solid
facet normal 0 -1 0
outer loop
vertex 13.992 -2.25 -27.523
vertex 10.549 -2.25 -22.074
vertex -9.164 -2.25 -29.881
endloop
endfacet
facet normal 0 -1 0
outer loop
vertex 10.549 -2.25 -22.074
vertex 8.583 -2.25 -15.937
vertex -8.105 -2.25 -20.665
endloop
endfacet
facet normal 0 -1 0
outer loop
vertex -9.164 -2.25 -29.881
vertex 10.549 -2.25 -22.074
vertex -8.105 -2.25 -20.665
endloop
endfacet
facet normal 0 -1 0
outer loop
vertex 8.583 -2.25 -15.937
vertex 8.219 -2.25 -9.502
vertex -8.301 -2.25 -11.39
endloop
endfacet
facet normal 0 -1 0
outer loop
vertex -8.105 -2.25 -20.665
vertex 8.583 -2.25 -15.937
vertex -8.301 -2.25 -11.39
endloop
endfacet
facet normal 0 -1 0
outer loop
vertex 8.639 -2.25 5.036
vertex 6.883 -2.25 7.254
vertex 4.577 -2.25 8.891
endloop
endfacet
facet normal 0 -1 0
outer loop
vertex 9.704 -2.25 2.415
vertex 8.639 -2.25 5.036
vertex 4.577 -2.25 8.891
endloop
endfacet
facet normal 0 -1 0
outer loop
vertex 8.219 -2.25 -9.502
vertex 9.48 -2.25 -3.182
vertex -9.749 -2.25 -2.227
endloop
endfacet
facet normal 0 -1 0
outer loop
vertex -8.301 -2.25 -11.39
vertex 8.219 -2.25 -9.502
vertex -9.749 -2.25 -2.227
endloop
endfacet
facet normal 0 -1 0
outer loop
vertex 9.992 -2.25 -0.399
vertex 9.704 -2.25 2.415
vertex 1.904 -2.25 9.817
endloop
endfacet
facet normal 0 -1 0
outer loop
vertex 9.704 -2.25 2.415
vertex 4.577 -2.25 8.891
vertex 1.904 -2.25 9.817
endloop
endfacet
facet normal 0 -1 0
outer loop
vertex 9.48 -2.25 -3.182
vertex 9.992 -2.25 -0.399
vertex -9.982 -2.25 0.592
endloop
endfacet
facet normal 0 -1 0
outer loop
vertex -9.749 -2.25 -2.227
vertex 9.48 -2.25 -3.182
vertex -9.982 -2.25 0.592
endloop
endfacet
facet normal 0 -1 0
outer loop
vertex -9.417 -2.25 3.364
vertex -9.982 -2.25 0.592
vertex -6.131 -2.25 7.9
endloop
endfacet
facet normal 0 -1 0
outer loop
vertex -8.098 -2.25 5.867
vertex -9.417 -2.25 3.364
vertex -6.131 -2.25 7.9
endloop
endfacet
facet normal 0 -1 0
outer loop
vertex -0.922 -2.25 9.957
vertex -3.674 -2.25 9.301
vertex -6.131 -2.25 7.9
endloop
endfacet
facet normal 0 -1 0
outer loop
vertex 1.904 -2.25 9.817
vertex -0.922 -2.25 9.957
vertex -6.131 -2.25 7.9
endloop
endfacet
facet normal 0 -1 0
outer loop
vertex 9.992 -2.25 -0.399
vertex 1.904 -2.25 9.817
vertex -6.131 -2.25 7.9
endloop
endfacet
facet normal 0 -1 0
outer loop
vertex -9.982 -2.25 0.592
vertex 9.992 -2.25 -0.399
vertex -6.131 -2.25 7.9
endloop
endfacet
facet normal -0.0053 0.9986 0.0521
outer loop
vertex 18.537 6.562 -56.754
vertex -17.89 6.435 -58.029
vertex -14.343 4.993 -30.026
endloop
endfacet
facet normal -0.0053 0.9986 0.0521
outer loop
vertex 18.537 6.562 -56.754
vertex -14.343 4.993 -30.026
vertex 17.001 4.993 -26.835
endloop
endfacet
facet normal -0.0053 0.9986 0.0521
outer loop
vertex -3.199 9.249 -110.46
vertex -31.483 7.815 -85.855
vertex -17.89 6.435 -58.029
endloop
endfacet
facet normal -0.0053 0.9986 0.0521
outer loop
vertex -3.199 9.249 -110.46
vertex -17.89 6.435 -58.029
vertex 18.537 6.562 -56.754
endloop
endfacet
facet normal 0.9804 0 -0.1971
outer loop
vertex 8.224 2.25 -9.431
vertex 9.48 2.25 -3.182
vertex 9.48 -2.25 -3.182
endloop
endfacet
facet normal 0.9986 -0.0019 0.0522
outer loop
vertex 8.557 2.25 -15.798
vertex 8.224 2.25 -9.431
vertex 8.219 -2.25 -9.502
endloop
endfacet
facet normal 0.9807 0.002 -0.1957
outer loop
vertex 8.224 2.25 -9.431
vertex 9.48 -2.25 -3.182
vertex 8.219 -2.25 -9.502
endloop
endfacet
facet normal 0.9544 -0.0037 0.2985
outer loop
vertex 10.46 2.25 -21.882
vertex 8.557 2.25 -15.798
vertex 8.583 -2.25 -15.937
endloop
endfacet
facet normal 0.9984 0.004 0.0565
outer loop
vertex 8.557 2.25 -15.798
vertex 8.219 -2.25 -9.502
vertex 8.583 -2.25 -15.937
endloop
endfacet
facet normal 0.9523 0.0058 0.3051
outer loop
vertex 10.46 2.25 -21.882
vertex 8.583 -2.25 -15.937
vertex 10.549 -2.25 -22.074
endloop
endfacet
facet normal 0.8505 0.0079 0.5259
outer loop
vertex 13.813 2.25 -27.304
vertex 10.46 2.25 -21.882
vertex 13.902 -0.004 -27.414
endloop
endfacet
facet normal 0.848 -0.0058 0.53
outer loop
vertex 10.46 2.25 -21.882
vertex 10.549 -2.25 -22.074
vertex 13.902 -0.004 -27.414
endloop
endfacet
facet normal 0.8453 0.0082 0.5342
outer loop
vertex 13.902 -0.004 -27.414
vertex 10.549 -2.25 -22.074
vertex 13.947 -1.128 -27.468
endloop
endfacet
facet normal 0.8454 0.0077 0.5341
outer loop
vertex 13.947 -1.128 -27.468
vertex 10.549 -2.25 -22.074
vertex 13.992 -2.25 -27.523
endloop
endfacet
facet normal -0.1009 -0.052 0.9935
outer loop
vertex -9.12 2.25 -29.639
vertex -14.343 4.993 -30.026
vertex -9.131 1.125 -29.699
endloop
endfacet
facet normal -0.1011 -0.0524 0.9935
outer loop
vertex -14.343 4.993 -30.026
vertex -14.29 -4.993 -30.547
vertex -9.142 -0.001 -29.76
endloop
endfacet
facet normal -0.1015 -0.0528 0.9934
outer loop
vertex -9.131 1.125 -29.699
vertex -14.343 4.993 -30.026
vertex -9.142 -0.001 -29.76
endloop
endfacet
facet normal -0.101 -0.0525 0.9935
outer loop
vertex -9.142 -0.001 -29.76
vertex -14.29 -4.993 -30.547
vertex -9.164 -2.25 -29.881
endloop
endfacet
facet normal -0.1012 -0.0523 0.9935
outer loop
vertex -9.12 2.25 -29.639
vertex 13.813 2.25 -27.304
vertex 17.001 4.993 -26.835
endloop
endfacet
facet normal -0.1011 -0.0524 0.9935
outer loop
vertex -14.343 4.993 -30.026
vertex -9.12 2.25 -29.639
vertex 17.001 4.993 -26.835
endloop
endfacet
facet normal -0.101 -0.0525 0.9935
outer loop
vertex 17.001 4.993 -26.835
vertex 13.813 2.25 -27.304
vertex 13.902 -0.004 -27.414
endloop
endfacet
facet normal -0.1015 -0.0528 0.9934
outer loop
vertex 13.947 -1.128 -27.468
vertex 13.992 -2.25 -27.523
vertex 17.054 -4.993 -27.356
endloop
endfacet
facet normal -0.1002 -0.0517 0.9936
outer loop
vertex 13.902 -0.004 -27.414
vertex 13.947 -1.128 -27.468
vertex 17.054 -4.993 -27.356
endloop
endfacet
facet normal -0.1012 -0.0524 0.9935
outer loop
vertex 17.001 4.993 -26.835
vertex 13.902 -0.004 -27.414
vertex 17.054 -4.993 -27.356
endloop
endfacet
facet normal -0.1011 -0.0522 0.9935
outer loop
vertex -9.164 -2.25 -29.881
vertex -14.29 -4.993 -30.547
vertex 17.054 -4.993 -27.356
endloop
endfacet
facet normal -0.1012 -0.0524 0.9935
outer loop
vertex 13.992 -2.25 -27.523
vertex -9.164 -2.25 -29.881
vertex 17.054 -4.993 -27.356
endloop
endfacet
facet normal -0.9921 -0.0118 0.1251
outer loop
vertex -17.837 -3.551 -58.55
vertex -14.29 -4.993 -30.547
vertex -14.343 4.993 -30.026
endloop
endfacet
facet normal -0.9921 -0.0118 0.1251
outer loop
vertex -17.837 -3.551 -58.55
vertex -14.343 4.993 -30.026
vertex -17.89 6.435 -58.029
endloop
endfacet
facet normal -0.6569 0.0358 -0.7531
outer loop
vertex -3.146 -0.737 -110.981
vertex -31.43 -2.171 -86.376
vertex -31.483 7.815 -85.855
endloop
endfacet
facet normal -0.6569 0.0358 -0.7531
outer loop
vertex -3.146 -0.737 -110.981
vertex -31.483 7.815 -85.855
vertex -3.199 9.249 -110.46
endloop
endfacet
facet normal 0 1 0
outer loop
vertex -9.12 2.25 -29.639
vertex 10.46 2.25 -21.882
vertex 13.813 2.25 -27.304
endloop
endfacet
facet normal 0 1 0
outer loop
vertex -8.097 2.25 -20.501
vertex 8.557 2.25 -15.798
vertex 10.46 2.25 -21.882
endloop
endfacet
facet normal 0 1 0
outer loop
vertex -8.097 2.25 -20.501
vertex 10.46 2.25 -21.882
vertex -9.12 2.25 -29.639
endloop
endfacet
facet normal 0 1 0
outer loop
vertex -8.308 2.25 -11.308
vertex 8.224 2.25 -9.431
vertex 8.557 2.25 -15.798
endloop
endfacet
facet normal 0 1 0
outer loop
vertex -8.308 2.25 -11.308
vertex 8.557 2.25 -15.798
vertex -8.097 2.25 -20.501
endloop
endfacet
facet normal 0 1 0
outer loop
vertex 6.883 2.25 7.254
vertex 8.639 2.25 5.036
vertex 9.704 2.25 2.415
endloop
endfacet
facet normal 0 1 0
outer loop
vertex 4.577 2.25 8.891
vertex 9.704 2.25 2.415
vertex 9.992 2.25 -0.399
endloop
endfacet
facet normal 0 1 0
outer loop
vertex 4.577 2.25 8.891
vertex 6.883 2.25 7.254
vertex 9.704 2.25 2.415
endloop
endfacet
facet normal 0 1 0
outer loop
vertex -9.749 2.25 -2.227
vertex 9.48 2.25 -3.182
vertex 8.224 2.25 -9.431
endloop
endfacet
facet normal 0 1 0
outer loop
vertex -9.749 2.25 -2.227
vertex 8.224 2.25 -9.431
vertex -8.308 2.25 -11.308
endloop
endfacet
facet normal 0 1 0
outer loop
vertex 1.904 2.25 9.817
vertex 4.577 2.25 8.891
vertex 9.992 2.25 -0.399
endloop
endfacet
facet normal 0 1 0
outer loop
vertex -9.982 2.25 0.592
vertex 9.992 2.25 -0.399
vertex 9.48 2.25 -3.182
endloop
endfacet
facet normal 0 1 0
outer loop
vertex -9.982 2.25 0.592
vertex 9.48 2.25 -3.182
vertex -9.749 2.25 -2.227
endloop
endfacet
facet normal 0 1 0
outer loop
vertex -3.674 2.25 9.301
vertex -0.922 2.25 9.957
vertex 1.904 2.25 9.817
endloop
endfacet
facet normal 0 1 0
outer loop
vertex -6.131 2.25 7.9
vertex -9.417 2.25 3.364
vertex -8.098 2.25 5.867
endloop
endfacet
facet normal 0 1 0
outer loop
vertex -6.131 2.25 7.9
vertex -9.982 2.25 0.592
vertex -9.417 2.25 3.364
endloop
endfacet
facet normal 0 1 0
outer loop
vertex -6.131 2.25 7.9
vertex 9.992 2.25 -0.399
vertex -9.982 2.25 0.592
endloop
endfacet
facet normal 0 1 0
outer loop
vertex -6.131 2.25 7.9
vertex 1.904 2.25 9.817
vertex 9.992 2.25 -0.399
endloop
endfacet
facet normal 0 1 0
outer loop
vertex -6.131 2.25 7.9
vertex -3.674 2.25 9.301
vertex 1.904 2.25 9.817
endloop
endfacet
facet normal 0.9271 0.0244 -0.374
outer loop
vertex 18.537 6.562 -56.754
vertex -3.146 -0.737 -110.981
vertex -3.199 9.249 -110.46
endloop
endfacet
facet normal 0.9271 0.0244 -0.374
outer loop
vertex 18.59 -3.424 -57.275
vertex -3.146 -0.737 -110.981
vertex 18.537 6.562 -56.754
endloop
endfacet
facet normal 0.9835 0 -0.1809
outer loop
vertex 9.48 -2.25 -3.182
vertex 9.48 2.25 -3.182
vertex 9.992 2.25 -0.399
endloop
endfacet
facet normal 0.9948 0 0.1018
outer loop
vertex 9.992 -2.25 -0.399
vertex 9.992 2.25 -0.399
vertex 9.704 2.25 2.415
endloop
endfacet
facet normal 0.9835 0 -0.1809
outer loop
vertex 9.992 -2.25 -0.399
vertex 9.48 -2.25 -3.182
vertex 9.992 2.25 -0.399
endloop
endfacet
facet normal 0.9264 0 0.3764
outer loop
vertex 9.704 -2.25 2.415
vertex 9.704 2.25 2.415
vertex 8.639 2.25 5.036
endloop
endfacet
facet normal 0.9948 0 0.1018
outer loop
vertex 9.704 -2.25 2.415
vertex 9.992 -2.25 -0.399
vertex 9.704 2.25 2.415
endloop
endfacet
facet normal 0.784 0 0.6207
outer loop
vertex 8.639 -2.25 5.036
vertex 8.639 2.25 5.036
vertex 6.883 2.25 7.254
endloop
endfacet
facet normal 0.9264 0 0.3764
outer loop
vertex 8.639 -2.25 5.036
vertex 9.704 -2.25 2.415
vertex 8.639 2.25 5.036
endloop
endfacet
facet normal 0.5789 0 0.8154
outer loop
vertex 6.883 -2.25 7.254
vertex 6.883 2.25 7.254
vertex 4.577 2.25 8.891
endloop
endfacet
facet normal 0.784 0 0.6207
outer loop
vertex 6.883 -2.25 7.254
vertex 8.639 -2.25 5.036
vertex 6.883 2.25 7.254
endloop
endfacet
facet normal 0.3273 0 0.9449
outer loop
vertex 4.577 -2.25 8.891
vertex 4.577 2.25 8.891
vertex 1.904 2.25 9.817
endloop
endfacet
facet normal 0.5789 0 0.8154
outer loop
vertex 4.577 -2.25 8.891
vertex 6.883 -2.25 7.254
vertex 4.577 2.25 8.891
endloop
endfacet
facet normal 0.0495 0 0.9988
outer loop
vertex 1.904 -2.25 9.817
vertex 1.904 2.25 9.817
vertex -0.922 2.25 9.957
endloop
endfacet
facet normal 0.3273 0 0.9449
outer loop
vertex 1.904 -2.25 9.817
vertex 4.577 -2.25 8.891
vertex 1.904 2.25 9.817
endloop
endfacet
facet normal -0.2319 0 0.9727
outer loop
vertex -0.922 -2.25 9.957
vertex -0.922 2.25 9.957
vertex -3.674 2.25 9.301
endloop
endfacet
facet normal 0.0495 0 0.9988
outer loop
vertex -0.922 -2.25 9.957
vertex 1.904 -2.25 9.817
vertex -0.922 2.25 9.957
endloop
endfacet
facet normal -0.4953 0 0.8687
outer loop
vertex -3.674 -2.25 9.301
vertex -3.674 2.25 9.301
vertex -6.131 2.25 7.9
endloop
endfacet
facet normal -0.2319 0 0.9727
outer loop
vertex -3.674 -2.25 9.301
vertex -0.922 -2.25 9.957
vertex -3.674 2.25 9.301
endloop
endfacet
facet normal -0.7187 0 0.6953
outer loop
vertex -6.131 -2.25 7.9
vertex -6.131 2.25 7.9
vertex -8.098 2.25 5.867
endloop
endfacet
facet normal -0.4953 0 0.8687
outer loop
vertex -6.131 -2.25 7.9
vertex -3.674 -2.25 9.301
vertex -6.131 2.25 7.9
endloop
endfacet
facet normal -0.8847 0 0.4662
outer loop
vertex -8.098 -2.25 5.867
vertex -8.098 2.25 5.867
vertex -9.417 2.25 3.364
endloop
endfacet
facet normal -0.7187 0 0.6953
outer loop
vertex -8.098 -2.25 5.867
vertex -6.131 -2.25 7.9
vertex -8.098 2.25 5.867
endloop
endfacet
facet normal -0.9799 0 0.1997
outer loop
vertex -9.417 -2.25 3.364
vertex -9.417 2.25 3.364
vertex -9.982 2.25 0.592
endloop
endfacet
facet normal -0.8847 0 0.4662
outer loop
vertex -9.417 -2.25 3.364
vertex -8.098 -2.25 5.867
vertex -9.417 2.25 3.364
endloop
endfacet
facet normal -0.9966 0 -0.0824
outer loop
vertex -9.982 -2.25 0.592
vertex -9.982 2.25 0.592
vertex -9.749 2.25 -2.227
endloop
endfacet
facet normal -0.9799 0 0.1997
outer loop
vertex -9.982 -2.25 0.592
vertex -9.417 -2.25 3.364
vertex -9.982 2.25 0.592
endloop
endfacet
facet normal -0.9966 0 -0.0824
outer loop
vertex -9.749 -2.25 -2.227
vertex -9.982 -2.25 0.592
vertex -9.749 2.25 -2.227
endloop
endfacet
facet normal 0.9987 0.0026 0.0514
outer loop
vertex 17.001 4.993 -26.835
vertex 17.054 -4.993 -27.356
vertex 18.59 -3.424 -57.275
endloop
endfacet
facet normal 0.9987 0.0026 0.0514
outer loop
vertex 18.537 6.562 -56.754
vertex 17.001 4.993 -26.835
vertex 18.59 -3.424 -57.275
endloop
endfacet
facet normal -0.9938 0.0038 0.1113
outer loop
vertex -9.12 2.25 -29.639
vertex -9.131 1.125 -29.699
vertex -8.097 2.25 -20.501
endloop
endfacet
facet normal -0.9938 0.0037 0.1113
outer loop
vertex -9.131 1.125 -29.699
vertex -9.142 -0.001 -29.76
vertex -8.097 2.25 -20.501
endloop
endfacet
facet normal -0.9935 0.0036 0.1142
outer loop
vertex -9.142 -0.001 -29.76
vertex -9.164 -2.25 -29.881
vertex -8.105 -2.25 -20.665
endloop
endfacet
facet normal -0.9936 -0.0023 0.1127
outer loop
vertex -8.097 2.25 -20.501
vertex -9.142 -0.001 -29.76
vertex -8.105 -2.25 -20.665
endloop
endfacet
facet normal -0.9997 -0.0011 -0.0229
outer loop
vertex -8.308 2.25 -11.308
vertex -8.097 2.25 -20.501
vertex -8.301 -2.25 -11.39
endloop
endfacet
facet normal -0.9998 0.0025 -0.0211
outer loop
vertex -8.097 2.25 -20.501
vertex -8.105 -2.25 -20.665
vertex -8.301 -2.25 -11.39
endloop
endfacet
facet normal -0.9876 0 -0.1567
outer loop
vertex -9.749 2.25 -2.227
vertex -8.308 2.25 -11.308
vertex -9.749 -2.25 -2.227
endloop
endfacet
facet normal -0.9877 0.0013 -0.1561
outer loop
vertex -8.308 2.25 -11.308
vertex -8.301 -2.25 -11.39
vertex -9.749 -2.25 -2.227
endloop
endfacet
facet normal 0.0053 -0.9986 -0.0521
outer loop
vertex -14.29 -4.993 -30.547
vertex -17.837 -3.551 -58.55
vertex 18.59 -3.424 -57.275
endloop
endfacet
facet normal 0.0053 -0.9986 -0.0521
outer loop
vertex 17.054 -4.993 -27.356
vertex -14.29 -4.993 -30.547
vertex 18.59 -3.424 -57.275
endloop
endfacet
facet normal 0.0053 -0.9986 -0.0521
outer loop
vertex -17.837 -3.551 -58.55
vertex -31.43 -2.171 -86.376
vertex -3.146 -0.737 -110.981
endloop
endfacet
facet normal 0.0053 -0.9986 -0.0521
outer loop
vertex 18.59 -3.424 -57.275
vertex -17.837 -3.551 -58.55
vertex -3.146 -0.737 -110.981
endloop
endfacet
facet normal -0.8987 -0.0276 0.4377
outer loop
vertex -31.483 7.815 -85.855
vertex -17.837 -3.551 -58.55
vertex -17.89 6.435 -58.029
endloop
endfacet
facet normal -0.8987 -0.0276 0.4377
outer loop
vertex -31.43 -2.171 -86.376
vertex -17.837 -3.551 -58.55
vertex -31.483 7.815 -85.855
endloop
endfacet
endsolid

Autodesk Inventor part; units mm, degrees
ref_plane "YZ Plane" through (0, 0, 0) normal (1, 0, 0) x (0, 1, 0)
ref_plane "XY Plane" through (0, 0, 0) normal (0, 0, 1) x (1, 0, 0)
sketch "Sketch1" plane through (0, 0, 0) normal (0, 1, 0) x (-1, 0, 0)
  circle A0 centre (0, 0) radius 10
  line L0 (10, 0) -> (9.2097, -30.1236) construction
  arc A1 (-17.027, -27.0939) -> (14.3169, -30.2866) centre (17.8178, 159.5407) ccw construction
  line L1 (0, 0) -> (-14.0737, -27.6212) construction
  line L2 (10, 0) -> (-10, 0) construction
  line L3 (0, -10) -> (0, 10) construction
  arc A2 (9.7489, -2.227) -> (9.2097, -30.1236) centre (76.4766, -17.4702) ccw
  arc A3 (-14.0737, -27.6212) -> (-9.4804, -3.1816) centre (-33.645, -11.2914) ccw
  line L4 (0, 0) -> (9.2097, -30.1236) construction
  line L5 (14.3169, -30.2866) -> (-17.027, -27.0939) construction
  line L6 (9.2097, -30.1236) -> (-14.0737, -27.6212) construction
  line L7 (-1.355, -28.6902) -> (-1.4214, -29.3415) construction
  line L8 (0, 0) -> (-17.027, -27.0939) construction
  line L9 (0, 0) -> (14.3169, -30.2866) construction
  line L10 (-17.027, -27.0939) -> (-14.0737, -27.6212) construction
  line L11 (0, 0) -> (-18.5691, -57.0543) construction
  line L12 (0, 0) -> (17.8587, -58.3272) construction
  line L13 (17.8587, -58.3272) -> (-18.5691, -57.0543) construction
  line L14 (-18.5691, -57.0543) -> (-17.027, -27.0939) construction
  line L15 (14.3169, -30.2866) -> (17.8587, -58.3272) construction
  line L16 (14.3169, -30.2866) -> (17.8587, -58.3272) construction
  line L17 (-17.027, -27.0939) -> (-18.5691, -57.0543) construction
  line L18 (17.8587, -58.3272) -> (31.4475, -86.1902) construction
  line L19 (-18.5691, -57.0543) -> (3.1581, -110.8309) construction
  line L20 (-18.5691, -57.0543) -> (39.4309, -57.0543) construction
  arc A4 (17.8587, -58.3272) -> (31.4475, -86.1902) centre (65.5771, -52.3) ccw construction
  arc A5 (-18.5691, -57.0543) -> (3.1581, -110.8309) centre (50.0978, -60.5886) ccw construction
  line L21 (31.4475, -86.1902) -> (3.1581, -110.8309) construction
  arc A6 (-14.0737, -27.6212) -> (9.2097, -30.1236) centre (17.8178, 159.5407) ccw
  dimension "d0" = 20
  dimension "d4" = 63
  dimension "d7" = 31
  dimension "d8" = 73
  dimension "d9" = 31.5
  dimension "d14" = 32
  dimension "d15" = 33.5
  dimension "d19" = 3
  dimension "d20" = 60
  dimension "d21" = 61
  dimension "d22" = 36.45
  dimension "d23" = 30
  dimension "d24" = 68.4466
  dimension "d25" = 25.4892
  dimension "d26" = 118
  dimension "d27" = 31
  dimension "d28" = 58
  dimension "d29" = 68
  dimension "d30" = 37.5161
  dimension "d142" = 28.2635
  dimension "d149" = 87.13
  dimension "d150" = 103.015
  dimension "d152" = 65.999
ref_plane "Work Plane11" through (-14.3169, 0, -30.2866) normal (-0.0053, 0.9986, 0.0521) x (0.9949, 0, 0.1013)
sketch "Sketch9" plane through (-14.3169, 0, -30.2866) normal (-0.0053, 0.9986, 0.0521) x (0.9949, 0, 0.1013)
  line L0 (0, 0) -> (31.5061, 0) projected
  line L1 (31.5061, 0) -> (30.004, 29.9624)
  line L2 (0, 0) -> (-6.3652, 27.5369)
  line L3 (-6.3652, 27.5369) -> (30.004, 29.9624) construction
  line L4 (-6.3652, 27.5369) -> (-22.7067, 53.88)
  line L5 (-22.7067, 53.88) -> (2.9398, 81.2608)
  line L6 (2.9398, 81.2608) -> (30.004, 29.9624)
  point P0 (17.3123, -28.6406)
  dimension "d141" = 30
  dimension "d143" = 28.263
  dimension "d144" = 36.45
  dimension "d146" = 58
  dimension "d147" = 31
  dimension "d148" = 37.516
  dimension "d151" = 87.13
  dimension "d153" = 66
extrude "Extrusion6" add sketch "Sketch1" along normal mid plane 4.5
extrude "Extrusion7" add sketch "Sketch9" along normal mid plane 10
properties part number "brace2.0"
